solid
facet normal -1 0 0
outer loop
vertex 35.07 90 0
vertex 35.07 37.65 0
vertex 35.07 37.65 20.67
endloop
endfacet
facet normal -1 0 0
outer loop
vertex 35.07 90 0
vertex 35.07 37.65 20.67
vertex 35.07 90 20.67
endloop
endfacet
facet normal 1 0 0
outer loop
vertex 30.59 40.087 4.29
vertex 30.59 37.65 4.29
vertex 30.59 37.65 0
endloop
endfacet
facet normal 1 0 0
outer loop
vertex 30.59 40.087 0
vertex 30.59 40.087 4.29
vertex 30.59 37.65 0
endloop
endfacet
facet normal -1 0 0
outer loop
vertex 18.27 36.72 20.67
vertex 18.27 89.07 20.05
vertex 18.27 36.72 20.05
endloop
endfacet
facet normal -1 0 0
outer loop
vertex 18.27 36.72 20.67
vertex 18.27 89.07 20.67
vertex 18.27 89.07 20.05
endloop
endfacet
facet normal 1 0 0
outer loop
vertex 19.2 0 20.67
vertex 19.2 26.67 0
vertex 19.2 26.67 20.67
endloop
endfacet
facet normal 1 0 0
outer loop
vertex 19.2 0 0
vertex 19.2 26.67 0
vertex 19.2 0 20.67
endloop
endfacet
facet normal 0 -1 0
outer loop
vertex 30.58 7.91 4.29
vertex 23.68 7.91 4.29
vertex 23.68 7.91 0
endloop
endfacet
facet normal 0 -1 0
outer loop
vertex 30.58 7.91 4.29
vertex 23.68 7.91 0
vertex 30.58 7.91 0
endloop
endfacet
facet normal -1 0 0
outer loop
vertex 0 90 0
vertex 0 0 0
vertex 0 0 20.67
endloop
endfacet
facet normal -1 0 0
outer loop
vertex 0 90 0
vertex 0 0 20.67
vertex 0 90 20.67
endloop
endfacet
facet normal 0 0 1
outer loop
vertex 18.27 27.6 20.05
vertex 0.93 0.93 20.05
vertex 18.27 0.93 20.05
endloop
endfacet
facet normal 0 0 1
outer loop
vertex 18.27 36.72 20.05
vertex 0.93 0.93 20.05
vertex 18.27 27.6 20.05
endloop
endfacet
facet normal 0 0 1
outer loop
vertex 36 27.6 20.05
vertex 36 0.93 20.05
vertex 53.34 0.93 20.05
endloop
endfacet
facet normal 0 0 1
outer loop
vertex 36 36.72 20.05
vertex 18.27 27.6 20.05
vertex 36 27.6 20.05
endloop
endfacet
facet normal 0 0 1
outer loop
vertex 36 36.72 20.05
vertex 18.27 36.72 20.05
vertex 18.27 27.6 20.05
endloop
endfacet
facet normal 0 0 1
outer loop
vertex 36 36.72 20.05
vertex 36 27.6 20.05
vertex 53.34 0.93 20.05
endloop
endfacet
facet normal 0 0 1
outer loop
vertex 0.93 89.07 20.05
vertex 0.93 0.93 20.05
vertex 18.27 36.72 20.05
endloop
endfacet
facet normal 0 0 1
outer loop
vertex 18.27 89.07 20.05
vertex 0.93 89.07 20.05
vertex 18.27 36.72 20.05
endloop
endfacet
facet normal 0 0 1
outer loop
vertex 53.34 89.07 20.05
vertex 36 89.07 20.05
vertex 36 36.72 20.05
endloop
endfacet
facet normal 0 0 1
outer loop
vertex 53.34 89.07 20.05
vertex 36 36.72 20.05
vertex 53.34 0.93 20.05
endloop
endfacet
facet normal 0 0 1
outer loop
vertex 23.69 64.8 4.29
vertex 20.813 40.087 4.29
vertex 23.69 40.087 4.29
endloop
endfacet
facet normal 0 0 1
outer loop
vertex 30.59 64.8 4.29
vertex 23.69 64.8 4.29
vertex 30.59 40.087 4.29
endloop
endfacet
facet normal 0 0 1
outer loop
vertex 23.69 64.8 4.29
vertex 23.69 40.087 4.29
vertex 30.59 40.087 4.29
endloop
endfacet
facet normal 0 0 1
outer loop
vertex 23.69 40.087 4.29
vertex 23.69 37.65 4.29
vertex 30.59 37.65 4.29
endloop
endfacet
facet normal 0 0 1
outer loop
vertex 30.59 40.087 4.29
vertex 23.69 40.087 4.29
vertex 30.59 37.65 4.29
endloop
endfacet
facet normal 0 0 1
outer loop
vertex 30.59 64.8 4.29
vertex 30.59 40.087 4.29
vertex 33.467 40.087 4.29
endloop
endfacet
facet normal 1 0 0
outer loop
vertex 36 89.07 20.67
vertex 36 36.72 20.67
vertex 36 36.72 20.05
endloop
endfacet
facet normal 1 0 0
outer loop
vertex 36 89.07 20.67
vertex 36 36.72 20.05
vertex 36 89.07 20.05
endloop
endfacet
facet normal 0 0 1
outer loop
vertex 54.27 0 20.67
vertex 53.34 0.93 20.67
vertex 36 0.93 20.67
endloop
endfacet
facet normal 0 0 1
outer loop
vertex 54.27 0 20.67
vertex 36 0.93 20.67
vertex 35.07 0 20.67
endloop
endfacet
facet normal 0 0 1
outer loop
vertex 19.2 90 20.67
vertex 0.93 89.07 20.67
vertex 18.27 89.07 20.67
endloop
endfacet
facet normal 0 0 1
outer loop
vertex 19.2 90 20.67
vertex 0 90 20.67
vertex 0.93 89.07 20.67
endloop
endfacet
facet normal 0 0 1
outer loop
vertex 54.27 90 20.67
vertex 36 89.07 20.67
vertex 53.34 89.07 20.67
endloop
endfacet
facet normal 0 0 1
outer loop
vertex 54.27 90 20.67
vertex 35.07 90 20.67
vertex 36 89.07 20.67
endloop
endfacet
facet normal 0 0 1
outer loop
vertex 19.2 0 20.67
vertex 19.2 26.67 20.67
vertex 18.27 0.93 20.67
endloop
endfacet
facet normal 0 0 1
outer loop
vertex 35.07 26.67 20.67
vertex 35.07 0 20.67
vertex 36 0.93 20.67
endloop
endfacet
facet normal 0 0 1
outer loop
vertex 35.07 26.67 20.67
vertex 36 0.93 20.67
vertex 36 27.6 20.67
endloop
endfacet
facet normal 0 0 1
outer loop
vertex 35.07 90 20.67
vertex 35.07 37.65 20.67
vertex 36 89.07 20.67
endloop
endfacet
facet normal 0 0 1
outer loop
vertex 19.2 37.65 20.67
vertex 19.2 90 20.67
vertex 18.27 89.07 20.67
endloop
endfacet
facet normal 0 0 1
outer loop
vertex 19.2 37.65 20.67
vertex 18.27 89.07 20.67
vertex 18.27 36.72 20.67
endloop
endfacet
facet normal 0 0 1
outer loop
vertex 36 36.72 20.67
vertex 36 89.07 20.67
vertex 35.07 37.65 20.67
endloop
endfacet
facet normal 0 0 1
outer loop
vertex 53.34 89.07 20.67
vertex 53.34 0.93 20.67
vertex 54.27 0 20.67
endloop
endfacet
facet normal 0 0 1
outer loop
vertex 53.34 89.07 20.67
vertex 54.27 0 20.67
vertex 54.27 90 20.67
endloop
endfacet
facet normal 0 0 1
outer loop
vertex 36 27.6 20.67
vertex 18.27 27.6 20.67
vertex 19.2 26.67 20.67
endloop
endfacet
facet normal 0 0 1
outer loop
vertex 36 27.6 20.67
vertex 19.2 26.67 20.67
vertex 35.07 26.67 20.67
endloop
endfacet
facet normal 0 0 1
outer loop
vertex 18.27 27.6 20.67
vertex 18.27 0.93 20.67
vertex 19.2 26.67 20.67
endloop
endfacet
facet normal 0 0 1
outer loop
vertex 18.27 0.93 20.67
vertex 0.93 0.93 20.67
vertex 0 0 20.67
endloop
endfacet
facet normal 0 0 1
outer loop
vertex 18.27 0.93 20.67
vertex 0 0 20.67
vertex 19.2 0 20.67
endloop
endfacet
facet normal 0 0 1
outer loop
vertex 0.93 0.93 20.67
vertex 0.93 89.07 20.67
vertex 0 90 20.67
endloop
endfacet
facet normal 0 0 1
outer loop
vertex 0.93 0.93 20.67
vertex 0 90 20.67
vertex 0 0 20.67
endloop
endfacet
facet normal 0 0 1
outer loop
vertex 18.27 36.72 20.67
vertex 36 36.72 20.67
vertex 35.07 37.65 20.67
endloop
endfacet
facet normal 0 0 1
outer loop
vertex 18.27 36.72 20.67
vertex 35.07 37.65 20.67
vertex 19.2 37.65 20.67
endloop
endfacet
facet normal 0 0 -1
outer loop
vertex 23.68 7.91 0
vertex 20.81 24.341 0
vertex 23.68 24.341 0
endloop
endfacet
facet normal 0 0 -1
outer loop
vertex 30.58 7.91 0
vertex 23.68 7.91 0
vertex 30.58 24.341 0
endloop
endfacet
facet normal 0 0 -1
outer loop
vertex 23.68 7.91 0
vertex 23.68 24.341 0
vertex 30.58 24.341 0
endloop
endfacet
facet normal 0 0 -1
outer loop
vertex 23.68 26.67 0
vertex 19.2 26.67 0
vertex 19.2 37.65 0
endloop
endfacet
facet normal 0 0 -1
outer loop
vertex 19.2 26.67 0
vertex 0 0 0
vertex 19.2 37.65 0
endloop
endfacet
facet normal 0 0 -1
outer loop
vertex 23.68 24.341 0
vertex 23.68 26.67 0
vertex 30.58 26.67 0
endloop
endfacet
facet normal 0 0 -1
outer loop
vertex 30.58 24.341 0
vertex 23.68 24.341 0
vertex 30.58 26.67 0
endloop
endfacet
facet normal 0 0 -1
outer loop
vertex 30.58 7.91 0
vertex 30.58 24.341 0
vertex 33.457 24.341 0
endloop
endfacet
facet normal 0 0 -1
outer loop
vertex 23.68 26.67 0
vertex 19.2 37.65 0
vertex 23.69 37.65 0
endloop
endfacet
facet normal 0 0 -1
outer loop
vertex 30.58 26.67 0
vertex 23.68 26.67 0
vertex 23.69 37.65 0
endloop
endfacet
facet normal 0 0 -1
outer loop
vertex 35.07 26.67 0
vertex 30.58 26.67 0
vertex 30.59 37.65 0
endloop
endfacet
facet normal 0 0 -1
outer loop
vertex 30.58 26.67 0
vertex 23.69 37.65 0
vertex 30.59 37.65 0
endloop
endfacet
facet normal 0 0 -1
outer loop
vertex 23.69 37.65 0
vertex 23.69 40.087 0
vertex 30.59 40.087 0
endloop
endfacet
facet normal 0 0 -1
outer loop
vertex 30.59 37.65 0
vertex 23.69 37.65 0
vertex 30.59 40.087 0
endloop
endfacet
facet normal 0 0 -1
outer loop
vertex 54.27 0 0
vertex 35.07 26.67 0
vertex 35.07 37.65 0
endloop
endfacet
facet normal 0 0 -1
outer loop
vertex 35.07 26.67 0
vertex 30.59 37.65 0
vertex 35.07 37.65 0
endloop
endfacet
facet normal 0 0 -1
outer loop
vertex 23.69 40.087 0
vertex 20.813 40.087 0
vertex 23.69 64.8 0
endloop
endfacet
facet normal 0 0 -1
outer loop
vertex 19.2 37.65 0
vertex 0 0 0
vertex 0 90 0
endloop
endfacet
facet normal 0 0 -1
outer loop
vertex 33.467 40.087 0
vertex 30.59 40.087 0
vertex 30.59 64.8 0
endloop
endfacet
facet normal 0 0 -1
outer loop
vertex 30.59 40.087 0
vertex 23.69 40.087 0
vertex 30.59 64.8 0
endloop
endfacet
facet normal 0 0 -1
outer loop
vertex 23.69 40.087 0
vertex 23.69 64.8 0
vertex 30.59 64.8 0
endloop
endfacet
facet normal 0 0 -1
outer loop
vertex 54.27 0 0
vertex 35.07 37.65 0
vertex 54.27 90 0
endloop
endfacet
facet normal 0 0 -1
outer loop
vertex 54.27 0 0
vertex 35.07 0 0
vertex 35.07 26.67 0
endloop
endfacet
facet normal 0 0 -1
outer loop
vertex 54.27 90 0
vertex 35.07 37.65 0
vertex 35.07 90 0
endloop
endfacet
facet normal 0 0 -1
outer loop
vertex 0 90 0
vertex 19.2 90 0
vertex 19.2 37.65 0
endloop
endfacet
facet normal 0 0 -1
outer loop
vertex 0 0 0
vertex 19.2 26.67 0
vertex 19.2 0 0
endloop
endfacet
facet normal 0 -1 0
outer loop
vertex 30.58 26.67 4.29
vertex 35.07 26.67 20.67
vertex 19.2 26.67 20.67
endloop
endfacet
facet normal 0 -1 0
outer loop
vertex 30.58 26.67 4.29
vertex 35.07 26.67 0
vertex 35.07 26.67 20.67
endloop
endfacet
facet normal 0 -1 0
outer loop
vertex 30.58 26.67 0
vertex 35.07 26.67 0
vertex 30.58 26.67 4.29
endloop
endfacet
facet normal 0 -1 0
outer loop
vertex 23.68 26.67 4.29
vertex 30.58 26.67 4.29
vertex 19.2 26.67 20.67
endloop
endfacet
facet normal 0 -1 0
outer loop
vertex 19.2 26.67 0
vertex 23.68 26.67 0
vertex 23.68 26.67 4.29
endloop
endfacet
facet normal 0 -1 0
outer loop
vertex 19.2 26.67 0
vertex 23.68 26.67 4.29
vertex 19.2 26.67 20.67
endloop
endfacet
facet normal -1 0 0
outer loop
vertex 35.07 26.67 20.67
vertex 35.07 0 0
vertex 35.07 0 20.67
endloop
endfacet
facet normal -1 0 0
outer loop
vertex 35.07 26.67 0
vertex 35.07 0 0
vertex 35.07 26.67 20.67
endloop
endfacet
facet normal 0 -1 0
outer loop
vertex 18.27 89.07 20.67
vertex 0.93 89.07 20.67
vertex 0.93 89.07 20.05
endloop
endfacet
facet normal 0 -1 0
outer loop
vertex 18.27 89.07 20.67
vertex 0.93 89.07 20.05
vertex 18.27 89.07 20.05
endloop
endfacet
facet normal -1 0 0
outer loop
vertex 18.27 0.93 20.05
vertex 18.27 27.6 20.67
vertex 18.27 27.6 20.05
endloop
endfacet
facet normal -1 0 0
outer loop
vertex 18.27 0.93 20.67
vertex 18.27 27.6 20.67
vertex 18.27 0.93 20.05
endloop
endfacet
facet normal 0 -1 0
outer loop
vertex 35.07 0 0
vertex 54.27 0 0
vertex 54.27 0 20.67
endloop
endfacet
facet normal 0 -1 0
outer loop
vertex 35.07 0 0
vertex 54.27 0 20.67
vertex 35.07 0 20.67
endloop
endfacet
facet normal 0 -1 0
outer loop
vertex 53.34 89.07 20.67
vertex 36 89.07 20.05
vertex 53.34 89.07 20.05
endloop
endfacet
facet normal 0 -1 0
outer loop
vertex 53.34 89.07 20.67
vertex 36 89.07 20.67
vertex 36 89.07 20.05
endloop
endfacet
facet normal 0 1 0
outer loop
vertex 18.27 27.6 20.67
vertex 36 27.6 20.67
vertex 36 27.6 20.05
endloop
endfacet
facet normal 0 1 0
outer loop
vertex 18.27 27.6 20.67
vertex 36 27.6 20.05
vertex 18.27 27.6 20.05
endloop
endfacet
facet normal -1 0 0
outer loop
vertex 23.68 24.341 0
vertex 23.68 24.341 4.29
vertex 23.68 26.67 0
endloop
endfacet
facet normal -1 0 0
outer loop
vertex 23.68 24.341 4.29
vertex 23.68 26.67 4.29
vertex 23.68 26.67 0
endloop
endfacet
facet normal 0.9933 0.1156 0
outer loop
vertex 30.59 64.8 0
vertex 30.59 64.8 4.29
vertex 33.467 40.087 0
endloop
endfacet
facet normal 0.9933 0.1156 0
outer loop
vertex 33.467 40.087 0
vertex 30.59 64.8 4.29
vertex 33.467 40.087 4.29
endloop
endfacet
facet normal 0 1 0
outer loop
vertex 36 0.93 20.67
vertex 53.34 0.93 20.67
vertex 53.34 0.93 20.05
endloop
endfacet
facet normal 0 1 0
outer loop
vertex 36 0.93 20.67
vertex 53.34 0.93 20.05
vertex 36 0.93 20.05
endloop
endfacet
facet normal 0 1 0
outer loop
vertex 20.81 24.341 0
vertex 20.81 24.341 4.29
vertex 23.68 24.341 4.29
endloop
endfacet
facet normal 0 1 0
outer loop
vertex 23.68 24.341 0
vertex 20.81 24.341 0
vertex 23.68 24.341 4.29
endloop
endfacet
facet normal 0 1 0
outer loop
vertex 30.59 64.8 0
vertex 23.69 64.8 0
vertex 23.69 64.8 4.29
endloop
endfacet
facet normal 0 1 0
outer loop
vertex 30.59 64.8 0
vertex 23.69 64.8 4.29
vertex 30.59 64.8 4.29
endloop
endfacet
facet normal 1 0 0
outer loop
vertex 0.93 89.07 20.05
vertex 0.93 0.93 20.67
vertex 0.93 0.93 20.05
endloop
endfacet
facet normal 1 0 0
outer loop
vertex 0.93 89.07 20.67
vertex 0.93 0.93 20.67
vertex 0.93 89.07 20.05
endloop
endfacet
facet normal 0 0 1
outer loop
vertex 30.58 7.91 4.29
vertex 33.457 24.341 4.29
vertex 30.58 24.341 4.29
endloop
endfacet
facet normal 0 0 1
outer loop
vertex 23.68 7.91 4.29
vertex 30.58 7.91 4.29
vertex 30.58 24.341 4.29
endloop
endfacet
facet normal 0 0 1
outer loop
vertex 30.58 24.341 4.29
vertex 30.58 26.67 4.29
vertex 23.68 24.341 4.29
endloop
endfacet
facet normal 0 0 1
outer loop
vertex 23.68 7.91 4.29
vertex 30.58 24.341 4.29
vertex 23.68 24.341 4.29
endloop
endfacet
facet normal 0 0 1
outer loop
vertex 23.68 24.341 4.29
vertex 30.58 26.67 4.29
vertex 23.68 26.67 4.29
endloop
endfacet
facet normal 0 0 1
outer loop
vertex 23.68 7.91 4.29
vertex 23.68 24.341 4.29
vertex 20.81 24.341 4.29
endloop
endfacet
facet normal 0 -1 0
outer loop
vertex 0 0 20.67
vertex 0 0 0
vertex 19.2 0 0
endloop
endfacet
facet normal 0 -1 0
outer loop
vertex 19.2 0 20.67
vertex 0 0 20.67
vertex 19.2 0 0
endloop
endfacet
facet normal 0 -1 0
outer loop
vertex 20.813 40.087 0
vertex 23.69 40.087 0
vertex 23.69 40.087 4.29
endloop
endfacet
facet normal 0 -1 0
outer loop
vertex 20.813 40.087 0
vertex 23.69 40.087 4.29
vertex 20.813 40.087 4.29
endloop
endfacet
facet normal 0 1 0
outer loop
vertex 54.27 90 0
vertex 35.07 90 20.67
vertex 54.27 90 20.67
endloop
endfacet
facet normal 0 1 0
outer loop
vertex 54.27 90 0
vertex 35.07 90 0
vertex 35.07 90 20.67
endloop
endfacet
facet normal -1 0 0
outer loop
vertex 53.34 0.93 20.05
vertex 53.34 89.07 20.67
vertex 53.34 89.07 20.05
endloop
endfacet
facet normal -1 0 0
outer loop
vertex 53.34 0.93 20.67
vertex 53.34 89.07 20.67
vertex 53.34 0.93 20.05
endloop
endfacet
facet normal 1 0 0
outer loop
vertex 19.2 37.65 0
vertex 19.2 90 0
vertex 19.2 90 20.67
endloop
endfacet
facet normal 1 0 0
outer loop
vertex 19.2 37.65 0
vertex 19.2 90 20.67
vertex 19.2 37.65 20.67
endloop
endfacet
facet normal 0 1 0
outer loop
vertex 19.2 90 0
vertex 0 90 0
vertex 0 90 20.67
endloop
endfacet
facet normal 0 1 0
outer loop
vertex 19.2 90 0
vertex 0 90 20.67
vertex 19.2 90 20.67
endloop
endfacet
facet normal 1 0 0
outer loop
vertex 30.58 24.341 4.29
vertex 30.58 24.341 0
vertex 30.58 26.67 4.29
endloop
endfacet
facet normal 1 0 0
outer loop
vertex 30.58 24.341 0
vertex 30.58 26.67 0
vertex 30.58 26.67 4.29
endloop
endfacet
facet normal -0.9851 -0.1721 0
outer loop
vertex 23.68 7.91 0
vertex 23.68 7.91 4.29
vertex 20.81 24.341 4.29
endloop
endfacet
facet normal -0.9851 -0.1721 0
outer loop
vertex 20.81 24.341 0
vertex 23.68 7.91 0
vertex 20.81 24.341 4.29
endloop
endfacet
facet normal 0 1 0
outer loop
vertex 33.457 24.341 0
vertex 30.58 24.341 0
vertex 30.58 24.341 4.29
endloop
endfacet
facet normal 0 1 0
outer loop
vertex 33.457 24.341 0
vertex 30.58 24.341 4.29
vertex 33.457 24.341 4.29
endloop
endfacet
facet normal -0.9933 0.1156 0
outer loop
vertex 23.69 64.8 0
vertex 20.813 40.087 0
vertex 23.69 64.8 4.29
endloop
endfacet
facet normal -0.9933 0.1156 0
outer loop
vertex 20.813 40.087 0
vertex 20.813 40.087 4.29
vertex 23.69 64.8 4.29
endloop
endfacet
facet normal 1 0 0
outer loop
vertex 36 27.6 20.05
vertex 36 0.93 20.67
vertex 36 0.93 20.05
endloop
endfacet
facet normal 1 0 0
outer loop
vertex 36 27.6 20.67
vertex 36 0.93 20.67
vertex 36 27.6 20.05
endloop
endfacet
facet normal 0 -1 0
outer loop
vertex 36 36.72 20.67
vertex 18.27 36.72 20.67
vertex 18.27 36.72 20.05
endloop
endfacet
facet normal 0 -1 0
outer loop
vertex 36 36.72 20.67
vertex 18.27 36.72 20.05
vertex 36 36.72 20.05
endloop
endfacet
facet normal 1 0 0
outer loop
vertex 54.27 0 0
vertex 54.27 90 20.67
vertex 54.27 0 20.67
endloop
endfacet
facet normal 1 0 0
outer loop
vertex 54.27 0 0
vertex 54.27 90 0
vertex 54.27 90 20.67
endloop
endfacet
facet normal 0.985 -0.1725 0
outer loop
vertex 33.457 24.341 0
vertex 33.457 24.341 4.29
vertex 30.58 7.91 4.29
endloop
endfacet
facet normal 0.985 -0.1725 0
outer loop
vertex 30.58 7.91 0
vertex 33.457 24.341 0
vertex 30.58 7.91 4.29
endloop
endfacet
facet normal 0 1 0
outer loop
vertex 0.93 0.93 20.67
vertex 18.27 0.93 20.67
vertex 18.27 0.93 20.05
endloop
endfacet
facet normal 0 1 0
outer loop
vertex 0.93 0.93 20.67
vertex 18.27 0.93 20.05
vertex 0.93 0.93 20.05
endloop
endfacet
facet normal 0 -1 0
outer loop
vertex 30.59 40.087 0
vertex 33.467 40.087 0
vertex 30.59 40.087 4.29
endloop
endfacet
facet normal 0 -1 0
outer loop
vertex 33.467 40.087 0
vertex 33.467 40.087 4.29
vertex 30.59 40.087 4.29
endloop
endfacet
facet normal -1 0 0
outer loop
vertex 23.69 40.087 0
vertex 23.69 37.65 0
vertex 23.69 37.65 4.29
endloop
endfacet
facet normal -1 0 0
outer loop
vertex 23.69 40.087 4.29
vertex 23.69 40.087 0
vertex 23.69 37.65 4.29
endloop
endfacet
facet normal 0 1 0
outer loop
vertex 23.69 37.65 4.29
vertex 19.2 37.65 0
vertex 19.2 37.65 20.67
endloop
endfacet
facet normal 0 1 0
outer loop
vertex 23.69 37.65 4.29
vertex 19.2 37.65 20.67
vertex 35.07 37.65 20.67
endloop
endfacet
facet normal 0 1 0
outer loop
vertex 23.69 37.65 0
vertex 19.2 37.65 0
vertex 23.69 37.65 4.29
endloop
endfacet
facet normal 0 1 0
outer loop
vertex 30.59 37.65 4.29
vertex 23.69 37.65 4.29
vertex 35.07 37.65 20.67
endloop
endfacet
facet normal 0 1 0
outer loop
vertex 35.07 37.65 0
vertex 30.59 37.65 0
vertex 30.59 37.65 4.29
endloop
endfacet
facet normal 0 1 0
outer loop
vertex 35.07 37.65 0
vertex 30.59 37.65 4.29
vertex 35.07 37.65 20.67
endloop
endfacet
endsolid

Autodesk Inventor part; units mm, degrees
ref_plane "YZ Plane" through (0, 0, 0) normal (1, 0, 0) x (0, 1, 0)
ref_plane "XZ Plane" through (0, 0, 0) normal (0, 1, 0) x (-1, 0, 0)
ref_plane "XY Plane" through (0, 0, 0) normal (0, 0, 1) x (1, 0, 0)
sketch "Sketch1" plane through (0, 0, 0) normal (0, 0, 1) x (1, 0, 0)
  line L0 (0, 0) -> (0, 90)
  line L1 (0, 90) -> (19.2, 90)
  line L2 (19.2, 90) -> (19.2, 37.65)
  line L3 (19.2, 37.65) -> (35.07, 37.65)
  line L4 (35.07, 37.65) -> (35.07, 90)
  line L5 (35.07, 90) -> (54.27, 90)
  line L6 (54.27, 90) -> (54.27, 0)
  line L7 (54.27, 0) -> (35.07, 0)
  line L8 (35.07, 0) -> (35.07, 26.67)
  line L9 (35.07, 26.67) -> (19.2, 26.67)
  line L10 (19.2, 26.67) -> (19.2, 0)
  line L11 (0, 0) -> (19.2, 0)
  dimension "d0" = 90
  dimension "d1" = 19.2
  dimension "d2" = 52.35
  dimension "d3" = 15.87
  dimension "d4" = 19.2
  dimension "d5" = 26.67
extrude "Extrusion1" add sketch "Sketch1" along normal blind 20.67
sketch "Sketch2" plane through (19.2, 37.65, 0) normal (0, 1, 0) x (1, 0, 0)
  line L0 (15.87, 0) -> (0, 0) projected
  line L1 (11.39, 0) -> (4.49, 0)
  line L2 (4.49, 0) -> (4.49, -4.29)
  line L3 (4.49, -4.29) -> (11.39, -4.29)
  line L4 (11.39, -4.29) -> (11.39, 0)
  point P0 (-19.2, 0)
  dimension "d8" = 6.9
  dimension "d9" = 4.29
extrude "Extrusion2" add sketch "Sketch2" along normal blind 27.15
sketch "Sketch3" plane through (23.69, 37.65, 4.29) normal (0, 0, 1) x (1, 0, 0)
  line L0 (6.9, 0) -> (0, 0) projected
  line L1 (0, 27.15) -> (6.9, 27.15) projected
  line L2 (0, 0) -> (0, 27.15) projected
  line L3 (6.9, 27.15) -> (9.7769, 2.4369)
  line L4 (6.9, 27.15) -> (31.78, 27.15) construction
  line L5 (9.7769, 2.4369) -> (6.9, 2.4369)
  line L6 (6.9, 0) -> (6.9, 27.15) projected
  line L7 (0, 2.4369) -> (-2.877, 2.4369)
  line L8 (-2.877, 2.4369) -> (0, 27.15)
  point P0 (-23.69, -37.65)
  dimension "d12" = 24.88
  dimension "d13" = 83.36
  dimension "d14" = 2.877
extrude "Extrusion3" add sketch "Sketch3" against normal blind 4.29
sketch "Sketch4" plane through (19.2, 26.67, 0) normal (0, -1, 0) x (1, 0, 0)
  line L0 (0, 0) -> (0, 20.67) projected
  line L1 (0, 0) -> (4.49, 0) projected
  line L2 (4.48, 0) -> (11.38, 0)
  line L3 (11.38, 0) -> (11.38, 4.29)
  line L4 (11.38, 4.29) -> (4.48, 4.29)
  line L5 (4.48, 4.29) -> (4.48, 0)
  point P0 (-19.2, 0)
  dimension "d17" = 6.9
  dimension "d18" = 4.29
  dimension "d19" = 4.48
extrude "Extrusion4" add sketch "Sketch4" along normal blind 18.76
sketch "Sketch5" plane through (23.68, 26.67, 4.29) normal (0, 0, 1) x (1, 0, 0)
  line L0 (0, 0) -> (6.9, 0) projected
  line L1 (0, 0) -> (0, -18.76) projected
  line L2 (6.9, -18.76) -> (0, -18.76) projected
  line L3 (0, -18.76) -> (-2.87, -2.3288)
  line L4 (-4.48, -26.67) -> (-4.48, 0) projected
  line L5 (-2.87, -2.3288) -> (0, -2.3288)
  line L6 (6.9, 0) -> (6.9, -18.76) projected
  line L7 (6.9, -2.3288) -> (9.777, -2.3288)
  line L8 (9.777, -2.3288) -> (6.9, -18.76)
  point P0 (-23.68, -26.67)
  dimension "d22" = 16.68
  dimension "d23" = 1.61
  dimension "d24" = 2.877
extrude "Extrusion5" add sketch "Sketch5" against normal blind 4.29
sketch "Sketch6" plane through (0, 0, 20.67) normal (0, 0, 1) x (1, 0, 0)
  line L0 (0.93, 0.93) -> (0.93, 89.07)
  line L1 (0, 90) -> (19.2, 90) projected
  line L2 (0.93, 89.07) -> (18.27, 89.07)
  line L3 (18.27, 89.07) -> (18.27, 36.72)
  line L4 (18.27, 36.72) -> (36, 36.72)
  line L5 (36, 36.72) -> (36, 89.07)
  line L6 (36, 89.07) -> (53.34, 89.07)
  line L7 (53.34, 89.07) -> (53.34, 0.93)
  line L8 (53.34, 0.93) -> (36, 0.93)
  line L9 (36, 0.93) -> (36, 27.6)
  line L10 (36, 27.6) -> (18.27, 27.6)
  line L11 (18.27, 27.6) -> (18.27, 0.93)
  line L12 (18.27, 0.93) -> (0.93, 0.93)
  dimension "d27" = 88.14
  dimension "d28" = 17.34
  dimension "d29" = 52.35
  dimension "d30" = 17.73
  dimension "d31" = 52.35
  dimension "d32" = 17.34
  dimension "d33" = 88.14
  dimension "d34" = 26.67
extrude "Extrusion6" cut sketch "Sketch6" against normal blind 0.62
properties part number "print Helix V1"
